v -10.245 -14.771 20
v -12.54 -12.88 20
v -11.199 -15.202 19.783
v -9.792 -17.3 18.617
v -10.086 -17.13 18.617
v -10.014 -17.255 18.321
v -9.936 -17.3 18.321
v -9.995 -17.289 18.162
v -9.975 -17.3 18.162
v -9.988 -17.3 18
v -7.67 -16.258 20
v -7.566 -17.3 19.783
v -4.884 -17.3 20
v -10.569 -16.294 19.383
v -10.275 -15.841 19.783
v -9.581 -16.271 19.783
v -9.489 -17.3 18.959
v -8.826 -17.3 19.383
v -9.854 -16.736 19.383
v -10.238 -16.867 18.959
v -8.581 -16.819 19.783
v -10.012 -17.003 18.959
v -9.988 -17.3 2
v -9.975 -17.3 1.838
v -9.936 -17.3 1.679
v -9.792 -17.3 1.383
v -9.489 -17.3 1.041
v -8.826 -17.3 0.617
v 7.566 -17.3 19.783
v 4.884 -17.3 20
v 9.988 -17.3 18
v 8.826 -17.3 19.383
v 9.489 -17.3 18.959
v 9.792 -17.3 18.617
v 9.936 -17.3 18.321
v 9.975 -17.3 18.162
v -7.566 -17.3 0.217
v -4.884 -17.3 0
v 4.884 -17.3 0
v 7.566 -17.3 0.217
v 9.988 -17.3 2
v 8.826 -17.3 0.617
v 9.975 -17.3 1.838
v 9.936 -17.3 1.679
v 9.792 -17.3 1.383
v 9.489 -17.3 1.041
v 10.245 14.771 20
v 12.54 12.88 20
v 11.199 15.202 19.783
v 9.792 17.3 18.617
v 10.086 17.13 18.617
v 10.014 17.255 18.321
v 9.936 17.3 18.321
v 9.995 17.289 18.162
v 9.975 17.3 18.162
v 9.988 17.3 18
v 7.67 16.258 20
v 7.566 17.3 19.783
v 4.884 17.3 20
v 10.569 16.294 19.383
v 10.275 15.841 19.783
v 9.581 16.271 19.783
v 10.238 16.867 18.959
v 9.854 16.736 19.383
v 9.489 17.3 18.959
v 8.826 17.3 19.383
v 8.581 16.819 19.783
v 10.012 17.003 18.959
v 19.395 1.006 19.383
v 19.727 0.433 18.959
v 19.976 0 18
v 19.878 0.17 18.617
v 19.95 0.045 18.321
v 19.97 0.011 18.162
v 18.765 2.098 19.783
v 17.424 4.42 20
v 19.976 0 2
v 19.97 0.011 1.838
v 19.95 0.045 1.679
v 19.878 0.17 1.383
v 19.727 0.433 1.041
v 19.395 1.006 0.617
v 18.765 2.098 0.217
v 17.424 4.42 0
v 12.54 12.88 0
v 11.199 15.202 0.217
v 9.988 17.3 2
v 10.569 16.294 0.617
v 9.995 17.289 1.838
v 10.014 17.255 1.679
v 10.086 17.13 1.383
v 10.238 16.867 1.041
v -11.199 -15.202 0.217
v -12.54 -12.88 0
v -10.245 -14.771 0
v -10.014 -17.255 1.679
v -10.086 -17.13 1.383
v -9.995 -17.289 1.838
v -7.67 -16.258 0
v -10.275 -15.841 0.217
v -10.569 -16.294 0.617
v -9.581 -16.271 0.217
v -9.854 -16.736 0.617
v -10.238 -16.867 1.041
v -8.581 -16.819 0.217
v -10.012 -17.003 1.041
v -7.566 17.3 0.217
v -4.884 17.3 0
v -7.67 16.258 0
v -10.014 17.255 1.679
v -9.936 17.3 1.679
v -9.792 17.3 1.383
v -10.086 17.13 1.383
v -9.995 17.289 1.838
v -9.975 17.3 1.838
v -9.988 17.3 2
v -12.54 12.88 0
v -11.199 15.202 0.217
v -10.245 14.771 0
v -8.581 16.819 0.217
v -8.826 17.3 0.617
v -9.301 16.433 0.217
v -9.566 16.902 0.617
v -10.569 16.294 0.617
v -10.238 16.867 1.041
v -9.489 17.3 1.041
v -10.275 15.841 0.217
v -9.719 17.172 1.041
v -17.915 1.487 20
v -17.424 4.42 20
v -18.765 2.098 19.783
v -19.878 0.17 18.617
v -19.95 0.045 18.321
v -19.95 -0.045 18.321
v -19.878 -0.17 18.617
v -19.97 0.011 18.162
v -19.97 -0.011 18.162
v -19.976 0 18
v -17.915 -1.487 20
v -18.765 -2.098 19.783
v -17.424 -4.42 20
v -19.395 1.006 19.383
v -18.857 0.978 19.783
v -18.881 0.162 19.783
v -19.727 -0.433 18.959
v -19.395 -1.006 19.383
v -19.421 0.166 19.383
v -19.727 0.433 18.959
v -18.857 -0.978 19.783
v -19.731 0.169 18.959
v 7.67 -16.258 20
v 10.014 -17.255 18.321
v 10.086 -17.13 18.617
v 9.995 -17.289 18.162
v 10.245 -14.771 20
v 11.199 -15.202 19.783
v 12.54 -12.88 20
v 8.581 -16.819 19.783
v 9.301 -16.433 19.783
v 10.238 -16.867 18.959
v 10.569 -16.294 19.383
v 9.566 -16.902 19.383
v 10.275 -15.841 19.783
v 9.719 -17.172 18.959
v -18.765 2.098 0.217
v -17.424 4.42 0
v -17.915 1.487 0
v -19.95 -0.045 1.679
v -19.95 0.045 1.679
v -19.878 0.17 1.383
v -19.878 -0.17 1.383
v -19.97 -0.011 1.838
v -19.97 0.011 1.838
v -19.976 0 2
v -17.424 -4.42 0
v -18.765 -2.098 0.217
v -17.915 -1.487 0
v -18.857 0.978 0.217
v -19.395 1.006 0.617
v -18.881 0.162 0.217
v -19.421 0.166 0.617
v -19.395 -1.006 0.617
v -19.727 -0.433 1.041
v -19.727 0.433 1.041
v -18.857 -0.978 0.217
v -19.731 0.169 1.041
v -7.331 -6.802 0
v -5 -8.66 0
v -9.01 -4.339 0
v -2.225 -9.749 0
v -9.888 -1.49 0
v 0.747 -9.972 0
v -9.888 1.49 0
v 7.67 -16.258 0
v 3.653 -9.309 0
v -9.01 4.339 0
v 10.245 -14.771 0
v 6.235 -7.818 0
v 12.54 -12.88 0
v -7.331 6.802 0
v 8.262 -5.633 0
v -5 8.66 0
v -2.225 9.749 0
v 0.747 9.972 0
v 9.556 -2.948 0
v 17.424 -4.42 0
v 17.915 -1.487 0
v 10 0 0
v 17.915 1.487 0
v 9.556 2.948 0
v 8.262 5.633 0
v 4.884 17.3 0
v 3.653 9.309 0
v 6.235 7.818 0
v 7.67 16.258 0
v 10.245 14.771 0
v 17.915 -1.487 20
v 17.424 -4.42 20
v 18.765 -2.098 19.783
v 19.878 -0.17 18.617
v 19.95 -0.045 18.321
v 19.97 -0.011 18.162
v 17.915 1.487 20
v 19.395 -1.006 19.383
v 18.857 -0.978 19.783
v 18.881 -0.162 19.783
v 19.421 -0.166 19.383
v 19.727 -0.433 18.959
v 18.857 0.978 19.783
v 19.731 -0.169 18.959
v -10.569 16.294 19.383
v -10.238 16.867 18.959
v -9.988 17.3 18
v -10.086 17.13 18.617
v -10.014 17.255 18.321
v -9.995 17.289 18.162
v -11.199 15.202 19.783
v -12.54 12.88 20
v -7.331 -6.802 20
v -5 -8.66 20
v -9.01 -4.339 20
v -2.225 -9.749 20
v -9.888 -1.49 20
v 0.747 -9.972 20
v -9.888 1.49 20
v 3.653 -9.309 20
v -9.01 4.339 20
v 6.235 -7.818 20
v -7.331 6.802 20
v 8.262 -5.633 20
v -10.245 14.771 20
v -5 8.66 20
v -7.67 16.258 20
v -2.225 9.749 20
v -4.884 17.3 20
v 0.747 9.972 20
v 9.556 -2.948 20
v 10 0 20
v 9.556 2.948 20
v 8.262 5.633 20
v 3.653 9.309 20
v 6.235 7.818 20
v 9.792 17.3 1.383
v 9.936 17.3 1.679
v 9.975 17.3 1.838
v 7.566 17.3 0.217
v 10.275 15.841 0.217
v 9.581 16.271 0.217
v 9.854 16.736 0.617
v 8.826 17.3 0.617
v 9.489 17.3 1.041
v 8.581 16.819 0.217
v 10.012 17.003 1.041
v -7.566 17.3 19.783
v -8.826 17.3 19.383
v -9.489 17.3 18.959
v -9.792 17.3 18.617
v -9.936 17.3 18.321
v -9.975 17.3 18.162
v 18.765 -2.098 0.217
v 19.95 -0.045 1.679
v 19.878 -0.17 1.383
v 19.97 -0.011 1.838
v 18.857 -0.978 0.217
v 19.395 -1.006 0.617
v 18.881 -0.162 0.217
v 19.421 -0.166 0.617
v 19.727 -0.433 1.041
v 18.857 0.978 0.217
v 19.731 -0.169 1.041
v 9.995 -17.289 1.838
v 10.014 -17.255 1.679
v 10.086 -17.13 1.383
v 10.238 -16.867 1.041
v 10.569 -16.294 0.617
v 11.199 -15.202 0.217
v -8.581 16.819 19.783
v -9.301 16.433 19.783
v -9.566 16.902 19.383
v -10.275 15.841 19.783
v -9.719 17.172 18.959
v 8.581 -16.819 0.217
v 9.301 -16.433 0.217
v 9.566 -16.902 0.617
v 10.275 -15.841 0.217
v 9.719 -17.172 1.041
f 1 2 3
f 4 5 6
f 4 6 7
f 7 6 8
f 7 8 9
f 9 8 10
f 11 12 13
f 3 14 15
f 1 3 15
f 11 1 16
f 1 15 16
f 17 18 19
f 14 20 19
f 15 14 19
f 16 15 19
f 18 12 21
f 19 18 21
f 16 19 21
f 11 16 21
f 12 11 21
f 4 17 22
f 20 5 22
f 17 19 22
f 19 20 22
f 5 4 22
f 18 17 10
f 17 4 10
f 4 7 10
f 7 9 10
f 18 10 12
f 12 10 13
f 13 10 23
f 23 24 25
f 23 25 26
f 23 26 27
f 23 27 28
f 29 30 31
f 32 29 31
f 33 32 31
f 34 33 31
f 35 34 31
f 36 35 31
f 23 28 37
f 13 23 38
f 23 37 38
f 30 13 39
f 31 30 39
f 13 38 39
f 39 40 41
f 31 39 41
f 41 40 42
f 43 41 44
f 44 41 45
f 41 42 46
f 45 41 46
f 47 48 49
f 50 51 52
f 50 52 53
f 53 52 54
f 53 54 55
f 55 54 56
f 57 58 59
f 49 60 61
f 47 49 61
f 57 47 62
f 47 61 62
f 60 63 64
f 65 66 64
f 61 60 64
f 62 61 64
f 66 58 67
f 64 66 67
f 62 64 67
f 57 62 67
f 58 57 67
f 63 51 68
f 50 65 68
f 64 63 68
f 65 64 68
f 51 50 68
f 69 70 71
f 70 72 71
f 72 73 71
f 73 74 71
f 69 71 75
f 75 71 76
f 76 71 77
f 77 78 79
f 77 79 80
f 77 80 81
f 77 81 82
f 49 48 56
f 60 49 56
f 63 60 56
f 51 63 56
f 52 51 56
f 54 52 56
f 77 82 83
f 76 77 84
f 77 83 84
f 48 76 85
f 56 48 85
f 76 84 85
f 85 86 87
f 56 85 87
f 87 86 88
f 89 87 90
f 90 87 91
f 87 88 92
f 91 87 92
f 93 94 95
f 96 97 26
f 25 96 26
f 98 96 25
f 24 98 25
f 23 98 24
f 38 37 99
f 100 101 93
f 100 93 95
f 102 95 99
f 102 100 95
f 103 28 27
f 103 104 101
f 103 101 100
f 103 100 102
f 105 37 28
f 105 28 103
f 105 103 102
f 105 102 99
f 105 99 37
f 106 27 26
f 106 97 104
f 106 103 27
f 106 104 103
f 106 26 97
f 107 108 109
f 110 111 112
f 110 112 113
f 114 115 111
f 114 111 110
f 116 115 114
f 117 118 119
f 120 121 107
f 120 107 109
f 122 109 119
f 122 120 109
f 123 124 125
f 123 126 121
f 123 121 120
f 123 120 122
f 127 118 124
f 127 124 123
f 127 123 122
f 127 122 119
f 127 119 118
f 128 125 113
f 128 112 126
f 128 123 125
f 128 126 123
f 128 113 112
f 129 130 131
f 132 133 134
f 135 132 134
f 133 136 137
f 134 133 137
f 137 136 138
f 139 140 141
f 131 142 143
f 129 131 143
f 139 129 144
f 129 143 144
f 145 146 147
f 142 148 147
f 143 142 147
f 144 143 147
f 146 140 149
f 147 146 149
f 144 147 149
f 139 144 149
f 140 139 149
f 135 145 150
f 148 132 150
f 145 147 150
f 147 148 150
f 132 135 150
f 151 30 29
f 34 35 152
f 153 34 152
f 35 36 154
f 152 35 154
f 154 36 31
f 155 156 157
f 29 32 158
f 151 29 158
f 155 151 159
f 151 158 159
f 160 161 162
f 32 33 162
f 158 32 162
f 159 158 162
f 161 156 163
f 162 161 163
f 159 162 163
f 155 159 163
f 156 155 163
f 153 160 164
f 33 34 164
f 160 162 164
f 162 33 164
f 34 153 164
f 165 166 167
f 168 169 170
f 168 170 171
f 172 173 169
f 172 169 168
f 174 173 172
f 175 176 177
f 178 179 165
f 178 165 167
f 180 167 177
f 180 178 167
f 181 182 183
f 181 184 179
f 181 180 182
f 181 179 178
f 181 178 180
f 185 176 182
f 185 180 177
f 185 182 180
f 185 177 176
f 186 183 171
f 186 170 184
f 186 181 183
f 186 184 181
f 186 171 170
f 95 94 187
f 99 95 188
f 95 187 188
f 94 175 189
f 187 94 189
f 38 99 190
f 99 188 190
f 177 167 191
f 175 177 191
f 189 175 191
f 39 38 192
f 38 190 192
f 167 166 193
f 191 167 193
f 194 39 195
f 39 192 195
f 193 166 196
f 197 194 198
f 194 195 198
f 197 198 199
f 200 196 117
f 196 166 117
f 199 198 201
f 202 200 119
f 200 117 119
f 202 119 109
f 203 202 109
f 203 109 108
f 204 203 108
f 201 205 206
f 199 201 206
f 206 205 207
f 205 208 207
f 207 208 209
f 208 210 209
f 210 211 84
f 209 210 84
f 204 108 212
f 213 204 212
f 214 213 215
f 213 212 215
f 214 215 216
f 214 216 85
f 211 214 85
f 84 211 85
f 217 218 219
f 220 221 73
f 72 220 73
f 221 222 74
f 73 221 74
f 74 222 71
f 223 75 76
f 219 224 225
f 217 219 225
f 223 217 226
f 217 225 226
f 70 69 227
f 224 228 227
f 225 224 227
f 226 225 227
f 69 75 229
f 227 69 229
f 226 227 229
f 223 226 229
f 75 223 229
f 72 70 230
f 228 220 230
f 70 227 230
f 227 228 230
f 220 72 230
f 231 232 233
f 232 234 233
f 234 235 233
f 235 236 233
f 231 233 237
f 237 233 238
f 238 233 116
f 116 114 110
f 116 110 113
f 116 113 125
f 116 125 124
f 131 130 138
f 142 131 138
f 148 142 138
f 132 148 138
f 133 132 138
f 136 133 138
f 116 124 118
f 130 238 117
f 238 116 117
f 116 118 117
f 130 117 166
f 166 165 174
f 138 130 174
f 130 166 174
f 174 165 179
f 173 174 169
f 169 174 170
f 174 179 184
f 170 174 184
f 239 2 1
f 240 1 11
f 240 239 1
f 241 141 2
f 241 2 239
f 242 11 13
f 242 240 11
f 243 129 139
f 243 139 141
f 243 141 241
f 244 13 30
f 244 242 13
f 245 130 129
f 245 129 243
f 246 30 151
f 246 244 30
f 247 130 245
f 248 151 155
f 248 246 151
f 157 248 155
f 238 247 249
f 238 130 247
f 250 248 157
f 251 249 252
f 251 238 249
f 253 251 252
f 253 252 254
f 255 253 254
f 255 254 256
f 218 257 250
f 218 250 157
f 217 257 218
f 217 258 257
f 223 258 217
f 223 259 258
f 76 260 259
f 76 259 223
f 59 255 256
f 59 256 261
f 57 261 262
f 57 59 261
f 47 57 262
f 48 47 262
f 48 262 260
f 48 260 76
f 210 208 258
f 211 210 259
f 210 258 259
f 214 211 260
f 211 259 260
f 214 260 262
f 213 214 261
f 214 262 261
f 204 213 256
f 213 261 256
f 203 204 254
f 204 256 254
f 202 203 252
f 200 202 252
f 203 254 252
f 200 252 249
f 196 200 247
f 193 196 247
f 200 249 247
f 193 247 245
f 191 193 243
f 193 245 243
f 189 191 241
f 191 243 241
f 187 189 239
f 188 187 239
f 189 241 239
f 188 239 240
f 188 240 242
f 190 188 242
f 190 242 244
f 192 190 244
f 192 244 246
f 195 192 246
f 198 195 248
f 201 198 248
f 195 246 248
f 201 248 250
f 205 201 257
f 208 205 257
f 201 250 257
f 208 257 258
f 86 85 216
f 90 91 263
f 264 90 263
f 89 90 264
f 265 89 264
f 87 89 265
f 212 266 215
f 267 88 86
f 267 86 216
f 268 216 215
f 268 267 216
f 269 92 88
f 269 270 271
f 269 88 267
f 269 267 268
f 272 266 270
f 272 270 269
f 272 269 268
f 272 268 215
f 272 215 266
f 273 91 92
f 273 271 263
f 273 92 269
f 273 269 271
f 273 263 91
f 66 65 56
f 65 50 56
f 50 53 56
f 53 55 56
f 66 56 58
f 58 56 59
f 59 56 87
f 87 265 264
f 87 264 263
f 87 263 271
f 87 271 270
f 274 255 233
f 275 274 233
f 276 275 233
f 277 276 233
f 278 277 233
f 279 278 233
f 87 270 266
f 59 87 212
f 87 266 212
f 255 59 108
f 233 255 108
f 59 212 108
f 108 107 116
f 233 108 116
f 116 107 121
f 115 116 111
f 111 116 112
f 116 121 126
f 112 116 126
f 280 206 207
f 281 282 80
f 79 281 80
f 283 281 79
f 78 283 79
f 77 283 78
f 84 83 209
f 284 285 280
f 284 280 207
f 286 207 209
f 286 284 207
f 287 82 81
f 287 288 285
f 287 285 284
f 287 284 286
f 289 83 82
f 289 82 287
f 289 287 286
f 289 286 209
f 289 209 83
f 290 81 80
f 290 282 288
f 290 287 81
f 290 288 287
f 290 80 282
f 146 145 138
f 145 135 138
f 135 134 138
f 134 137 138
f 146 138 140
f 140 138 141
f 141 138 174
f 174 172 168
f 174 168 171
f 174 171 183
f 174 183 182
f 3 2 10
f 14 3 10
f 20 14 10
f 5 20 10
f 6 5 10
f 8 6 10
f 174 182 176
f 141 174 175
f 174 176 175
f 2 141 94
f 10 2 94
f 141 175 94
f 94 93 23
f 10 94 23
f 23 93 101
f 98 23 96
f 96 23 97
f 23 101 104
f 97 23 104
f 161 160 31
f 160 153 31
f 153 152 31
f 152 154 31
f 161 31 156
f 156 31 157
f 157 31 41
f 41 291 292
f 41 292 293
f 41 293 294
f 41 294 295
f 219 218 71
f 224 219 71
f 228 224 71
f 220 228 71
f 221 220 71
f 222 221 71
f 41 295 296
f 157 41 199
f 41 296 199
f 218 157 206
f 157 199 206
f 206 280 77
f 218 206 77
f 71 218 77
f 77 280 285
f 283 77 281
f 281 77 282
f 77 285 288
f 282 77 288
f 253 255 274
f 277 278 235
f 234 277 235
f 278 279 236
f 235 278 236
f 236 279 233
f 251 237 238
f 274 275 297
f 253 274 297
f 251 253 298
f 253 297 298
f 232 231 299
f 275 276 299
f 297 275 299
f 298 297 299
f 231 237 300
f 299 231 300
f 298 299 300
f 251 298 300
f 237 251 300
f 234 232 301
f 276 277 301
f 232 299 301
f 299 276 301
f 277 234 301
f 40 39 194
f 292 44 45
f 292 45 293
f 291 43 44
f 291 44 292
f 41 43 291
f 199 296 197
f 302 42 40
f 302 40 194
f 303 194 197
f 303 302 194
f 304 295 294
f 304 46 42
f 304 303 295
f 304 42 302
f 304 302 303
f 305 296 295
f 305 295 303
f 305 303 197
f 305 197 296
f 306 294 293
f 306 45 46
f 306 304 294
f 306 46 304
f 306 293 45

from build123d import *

# Parameters (mm, degrees)
BOSS_EXTRUDE1_DEPTH = 20
SKETCH2_R           = 10
CUT_EXTRUDE1_DEPTH  = 20


with BuildPart() as part:
    # Sketch1 → Boss-Extrude1 (new body)
    with BuildSketch(Plane.XY):
        Polygon((-19.976319314, 0), (-9.988159657, -17.3), (9.988159657, -17.3), (19.976319314, 0), (9.988159657, 17.3), (-9.988159657, 17.3), align=None)
    extrude(amount=BOSS_EXTRUDE1_DEPTH)

    # Sketch2 → Cut-Extrude1 (cut)
    with BuildSketch(Plane.XY.offset(20)):
        Circle(SKETCH2_R)
    extrude(amount=-CUT_EXTRUDE1_DEPTH, mode=Mode.SUBTRACT)

    # Sketch3 → Cut-Revolve1 (revolve, cut)
    with BuildSketch(Plane(origin=(0, 0, 0), x_dir=(1, 0, 0), z_dir=(0, 1, 0))):
        with BuildLine():
            Line((19.976319314, -2), (19.976319314, 0))
            Line((19.976319314, 0), (17.976319314, 0))
            ThreePointArc((17.976319314, 0), (19.390532876, -0.585786438), (19.976319314, -2))
        make_face()
    cut_revolve1 = revolve(axis=Axis((0, 0, 0), (0, 0, 1)), mode=Mode.SUBTRACT)

    # Mirror1: Cut-Revolve1 across plane
    add(cut_revolve1.mirror(Plane(origin=(0, 0, 10), x_dir=(1, 0, 0), z_dir=(0, 0, -1))), mode=Mode.SUBTRACT)


solid = part.part
